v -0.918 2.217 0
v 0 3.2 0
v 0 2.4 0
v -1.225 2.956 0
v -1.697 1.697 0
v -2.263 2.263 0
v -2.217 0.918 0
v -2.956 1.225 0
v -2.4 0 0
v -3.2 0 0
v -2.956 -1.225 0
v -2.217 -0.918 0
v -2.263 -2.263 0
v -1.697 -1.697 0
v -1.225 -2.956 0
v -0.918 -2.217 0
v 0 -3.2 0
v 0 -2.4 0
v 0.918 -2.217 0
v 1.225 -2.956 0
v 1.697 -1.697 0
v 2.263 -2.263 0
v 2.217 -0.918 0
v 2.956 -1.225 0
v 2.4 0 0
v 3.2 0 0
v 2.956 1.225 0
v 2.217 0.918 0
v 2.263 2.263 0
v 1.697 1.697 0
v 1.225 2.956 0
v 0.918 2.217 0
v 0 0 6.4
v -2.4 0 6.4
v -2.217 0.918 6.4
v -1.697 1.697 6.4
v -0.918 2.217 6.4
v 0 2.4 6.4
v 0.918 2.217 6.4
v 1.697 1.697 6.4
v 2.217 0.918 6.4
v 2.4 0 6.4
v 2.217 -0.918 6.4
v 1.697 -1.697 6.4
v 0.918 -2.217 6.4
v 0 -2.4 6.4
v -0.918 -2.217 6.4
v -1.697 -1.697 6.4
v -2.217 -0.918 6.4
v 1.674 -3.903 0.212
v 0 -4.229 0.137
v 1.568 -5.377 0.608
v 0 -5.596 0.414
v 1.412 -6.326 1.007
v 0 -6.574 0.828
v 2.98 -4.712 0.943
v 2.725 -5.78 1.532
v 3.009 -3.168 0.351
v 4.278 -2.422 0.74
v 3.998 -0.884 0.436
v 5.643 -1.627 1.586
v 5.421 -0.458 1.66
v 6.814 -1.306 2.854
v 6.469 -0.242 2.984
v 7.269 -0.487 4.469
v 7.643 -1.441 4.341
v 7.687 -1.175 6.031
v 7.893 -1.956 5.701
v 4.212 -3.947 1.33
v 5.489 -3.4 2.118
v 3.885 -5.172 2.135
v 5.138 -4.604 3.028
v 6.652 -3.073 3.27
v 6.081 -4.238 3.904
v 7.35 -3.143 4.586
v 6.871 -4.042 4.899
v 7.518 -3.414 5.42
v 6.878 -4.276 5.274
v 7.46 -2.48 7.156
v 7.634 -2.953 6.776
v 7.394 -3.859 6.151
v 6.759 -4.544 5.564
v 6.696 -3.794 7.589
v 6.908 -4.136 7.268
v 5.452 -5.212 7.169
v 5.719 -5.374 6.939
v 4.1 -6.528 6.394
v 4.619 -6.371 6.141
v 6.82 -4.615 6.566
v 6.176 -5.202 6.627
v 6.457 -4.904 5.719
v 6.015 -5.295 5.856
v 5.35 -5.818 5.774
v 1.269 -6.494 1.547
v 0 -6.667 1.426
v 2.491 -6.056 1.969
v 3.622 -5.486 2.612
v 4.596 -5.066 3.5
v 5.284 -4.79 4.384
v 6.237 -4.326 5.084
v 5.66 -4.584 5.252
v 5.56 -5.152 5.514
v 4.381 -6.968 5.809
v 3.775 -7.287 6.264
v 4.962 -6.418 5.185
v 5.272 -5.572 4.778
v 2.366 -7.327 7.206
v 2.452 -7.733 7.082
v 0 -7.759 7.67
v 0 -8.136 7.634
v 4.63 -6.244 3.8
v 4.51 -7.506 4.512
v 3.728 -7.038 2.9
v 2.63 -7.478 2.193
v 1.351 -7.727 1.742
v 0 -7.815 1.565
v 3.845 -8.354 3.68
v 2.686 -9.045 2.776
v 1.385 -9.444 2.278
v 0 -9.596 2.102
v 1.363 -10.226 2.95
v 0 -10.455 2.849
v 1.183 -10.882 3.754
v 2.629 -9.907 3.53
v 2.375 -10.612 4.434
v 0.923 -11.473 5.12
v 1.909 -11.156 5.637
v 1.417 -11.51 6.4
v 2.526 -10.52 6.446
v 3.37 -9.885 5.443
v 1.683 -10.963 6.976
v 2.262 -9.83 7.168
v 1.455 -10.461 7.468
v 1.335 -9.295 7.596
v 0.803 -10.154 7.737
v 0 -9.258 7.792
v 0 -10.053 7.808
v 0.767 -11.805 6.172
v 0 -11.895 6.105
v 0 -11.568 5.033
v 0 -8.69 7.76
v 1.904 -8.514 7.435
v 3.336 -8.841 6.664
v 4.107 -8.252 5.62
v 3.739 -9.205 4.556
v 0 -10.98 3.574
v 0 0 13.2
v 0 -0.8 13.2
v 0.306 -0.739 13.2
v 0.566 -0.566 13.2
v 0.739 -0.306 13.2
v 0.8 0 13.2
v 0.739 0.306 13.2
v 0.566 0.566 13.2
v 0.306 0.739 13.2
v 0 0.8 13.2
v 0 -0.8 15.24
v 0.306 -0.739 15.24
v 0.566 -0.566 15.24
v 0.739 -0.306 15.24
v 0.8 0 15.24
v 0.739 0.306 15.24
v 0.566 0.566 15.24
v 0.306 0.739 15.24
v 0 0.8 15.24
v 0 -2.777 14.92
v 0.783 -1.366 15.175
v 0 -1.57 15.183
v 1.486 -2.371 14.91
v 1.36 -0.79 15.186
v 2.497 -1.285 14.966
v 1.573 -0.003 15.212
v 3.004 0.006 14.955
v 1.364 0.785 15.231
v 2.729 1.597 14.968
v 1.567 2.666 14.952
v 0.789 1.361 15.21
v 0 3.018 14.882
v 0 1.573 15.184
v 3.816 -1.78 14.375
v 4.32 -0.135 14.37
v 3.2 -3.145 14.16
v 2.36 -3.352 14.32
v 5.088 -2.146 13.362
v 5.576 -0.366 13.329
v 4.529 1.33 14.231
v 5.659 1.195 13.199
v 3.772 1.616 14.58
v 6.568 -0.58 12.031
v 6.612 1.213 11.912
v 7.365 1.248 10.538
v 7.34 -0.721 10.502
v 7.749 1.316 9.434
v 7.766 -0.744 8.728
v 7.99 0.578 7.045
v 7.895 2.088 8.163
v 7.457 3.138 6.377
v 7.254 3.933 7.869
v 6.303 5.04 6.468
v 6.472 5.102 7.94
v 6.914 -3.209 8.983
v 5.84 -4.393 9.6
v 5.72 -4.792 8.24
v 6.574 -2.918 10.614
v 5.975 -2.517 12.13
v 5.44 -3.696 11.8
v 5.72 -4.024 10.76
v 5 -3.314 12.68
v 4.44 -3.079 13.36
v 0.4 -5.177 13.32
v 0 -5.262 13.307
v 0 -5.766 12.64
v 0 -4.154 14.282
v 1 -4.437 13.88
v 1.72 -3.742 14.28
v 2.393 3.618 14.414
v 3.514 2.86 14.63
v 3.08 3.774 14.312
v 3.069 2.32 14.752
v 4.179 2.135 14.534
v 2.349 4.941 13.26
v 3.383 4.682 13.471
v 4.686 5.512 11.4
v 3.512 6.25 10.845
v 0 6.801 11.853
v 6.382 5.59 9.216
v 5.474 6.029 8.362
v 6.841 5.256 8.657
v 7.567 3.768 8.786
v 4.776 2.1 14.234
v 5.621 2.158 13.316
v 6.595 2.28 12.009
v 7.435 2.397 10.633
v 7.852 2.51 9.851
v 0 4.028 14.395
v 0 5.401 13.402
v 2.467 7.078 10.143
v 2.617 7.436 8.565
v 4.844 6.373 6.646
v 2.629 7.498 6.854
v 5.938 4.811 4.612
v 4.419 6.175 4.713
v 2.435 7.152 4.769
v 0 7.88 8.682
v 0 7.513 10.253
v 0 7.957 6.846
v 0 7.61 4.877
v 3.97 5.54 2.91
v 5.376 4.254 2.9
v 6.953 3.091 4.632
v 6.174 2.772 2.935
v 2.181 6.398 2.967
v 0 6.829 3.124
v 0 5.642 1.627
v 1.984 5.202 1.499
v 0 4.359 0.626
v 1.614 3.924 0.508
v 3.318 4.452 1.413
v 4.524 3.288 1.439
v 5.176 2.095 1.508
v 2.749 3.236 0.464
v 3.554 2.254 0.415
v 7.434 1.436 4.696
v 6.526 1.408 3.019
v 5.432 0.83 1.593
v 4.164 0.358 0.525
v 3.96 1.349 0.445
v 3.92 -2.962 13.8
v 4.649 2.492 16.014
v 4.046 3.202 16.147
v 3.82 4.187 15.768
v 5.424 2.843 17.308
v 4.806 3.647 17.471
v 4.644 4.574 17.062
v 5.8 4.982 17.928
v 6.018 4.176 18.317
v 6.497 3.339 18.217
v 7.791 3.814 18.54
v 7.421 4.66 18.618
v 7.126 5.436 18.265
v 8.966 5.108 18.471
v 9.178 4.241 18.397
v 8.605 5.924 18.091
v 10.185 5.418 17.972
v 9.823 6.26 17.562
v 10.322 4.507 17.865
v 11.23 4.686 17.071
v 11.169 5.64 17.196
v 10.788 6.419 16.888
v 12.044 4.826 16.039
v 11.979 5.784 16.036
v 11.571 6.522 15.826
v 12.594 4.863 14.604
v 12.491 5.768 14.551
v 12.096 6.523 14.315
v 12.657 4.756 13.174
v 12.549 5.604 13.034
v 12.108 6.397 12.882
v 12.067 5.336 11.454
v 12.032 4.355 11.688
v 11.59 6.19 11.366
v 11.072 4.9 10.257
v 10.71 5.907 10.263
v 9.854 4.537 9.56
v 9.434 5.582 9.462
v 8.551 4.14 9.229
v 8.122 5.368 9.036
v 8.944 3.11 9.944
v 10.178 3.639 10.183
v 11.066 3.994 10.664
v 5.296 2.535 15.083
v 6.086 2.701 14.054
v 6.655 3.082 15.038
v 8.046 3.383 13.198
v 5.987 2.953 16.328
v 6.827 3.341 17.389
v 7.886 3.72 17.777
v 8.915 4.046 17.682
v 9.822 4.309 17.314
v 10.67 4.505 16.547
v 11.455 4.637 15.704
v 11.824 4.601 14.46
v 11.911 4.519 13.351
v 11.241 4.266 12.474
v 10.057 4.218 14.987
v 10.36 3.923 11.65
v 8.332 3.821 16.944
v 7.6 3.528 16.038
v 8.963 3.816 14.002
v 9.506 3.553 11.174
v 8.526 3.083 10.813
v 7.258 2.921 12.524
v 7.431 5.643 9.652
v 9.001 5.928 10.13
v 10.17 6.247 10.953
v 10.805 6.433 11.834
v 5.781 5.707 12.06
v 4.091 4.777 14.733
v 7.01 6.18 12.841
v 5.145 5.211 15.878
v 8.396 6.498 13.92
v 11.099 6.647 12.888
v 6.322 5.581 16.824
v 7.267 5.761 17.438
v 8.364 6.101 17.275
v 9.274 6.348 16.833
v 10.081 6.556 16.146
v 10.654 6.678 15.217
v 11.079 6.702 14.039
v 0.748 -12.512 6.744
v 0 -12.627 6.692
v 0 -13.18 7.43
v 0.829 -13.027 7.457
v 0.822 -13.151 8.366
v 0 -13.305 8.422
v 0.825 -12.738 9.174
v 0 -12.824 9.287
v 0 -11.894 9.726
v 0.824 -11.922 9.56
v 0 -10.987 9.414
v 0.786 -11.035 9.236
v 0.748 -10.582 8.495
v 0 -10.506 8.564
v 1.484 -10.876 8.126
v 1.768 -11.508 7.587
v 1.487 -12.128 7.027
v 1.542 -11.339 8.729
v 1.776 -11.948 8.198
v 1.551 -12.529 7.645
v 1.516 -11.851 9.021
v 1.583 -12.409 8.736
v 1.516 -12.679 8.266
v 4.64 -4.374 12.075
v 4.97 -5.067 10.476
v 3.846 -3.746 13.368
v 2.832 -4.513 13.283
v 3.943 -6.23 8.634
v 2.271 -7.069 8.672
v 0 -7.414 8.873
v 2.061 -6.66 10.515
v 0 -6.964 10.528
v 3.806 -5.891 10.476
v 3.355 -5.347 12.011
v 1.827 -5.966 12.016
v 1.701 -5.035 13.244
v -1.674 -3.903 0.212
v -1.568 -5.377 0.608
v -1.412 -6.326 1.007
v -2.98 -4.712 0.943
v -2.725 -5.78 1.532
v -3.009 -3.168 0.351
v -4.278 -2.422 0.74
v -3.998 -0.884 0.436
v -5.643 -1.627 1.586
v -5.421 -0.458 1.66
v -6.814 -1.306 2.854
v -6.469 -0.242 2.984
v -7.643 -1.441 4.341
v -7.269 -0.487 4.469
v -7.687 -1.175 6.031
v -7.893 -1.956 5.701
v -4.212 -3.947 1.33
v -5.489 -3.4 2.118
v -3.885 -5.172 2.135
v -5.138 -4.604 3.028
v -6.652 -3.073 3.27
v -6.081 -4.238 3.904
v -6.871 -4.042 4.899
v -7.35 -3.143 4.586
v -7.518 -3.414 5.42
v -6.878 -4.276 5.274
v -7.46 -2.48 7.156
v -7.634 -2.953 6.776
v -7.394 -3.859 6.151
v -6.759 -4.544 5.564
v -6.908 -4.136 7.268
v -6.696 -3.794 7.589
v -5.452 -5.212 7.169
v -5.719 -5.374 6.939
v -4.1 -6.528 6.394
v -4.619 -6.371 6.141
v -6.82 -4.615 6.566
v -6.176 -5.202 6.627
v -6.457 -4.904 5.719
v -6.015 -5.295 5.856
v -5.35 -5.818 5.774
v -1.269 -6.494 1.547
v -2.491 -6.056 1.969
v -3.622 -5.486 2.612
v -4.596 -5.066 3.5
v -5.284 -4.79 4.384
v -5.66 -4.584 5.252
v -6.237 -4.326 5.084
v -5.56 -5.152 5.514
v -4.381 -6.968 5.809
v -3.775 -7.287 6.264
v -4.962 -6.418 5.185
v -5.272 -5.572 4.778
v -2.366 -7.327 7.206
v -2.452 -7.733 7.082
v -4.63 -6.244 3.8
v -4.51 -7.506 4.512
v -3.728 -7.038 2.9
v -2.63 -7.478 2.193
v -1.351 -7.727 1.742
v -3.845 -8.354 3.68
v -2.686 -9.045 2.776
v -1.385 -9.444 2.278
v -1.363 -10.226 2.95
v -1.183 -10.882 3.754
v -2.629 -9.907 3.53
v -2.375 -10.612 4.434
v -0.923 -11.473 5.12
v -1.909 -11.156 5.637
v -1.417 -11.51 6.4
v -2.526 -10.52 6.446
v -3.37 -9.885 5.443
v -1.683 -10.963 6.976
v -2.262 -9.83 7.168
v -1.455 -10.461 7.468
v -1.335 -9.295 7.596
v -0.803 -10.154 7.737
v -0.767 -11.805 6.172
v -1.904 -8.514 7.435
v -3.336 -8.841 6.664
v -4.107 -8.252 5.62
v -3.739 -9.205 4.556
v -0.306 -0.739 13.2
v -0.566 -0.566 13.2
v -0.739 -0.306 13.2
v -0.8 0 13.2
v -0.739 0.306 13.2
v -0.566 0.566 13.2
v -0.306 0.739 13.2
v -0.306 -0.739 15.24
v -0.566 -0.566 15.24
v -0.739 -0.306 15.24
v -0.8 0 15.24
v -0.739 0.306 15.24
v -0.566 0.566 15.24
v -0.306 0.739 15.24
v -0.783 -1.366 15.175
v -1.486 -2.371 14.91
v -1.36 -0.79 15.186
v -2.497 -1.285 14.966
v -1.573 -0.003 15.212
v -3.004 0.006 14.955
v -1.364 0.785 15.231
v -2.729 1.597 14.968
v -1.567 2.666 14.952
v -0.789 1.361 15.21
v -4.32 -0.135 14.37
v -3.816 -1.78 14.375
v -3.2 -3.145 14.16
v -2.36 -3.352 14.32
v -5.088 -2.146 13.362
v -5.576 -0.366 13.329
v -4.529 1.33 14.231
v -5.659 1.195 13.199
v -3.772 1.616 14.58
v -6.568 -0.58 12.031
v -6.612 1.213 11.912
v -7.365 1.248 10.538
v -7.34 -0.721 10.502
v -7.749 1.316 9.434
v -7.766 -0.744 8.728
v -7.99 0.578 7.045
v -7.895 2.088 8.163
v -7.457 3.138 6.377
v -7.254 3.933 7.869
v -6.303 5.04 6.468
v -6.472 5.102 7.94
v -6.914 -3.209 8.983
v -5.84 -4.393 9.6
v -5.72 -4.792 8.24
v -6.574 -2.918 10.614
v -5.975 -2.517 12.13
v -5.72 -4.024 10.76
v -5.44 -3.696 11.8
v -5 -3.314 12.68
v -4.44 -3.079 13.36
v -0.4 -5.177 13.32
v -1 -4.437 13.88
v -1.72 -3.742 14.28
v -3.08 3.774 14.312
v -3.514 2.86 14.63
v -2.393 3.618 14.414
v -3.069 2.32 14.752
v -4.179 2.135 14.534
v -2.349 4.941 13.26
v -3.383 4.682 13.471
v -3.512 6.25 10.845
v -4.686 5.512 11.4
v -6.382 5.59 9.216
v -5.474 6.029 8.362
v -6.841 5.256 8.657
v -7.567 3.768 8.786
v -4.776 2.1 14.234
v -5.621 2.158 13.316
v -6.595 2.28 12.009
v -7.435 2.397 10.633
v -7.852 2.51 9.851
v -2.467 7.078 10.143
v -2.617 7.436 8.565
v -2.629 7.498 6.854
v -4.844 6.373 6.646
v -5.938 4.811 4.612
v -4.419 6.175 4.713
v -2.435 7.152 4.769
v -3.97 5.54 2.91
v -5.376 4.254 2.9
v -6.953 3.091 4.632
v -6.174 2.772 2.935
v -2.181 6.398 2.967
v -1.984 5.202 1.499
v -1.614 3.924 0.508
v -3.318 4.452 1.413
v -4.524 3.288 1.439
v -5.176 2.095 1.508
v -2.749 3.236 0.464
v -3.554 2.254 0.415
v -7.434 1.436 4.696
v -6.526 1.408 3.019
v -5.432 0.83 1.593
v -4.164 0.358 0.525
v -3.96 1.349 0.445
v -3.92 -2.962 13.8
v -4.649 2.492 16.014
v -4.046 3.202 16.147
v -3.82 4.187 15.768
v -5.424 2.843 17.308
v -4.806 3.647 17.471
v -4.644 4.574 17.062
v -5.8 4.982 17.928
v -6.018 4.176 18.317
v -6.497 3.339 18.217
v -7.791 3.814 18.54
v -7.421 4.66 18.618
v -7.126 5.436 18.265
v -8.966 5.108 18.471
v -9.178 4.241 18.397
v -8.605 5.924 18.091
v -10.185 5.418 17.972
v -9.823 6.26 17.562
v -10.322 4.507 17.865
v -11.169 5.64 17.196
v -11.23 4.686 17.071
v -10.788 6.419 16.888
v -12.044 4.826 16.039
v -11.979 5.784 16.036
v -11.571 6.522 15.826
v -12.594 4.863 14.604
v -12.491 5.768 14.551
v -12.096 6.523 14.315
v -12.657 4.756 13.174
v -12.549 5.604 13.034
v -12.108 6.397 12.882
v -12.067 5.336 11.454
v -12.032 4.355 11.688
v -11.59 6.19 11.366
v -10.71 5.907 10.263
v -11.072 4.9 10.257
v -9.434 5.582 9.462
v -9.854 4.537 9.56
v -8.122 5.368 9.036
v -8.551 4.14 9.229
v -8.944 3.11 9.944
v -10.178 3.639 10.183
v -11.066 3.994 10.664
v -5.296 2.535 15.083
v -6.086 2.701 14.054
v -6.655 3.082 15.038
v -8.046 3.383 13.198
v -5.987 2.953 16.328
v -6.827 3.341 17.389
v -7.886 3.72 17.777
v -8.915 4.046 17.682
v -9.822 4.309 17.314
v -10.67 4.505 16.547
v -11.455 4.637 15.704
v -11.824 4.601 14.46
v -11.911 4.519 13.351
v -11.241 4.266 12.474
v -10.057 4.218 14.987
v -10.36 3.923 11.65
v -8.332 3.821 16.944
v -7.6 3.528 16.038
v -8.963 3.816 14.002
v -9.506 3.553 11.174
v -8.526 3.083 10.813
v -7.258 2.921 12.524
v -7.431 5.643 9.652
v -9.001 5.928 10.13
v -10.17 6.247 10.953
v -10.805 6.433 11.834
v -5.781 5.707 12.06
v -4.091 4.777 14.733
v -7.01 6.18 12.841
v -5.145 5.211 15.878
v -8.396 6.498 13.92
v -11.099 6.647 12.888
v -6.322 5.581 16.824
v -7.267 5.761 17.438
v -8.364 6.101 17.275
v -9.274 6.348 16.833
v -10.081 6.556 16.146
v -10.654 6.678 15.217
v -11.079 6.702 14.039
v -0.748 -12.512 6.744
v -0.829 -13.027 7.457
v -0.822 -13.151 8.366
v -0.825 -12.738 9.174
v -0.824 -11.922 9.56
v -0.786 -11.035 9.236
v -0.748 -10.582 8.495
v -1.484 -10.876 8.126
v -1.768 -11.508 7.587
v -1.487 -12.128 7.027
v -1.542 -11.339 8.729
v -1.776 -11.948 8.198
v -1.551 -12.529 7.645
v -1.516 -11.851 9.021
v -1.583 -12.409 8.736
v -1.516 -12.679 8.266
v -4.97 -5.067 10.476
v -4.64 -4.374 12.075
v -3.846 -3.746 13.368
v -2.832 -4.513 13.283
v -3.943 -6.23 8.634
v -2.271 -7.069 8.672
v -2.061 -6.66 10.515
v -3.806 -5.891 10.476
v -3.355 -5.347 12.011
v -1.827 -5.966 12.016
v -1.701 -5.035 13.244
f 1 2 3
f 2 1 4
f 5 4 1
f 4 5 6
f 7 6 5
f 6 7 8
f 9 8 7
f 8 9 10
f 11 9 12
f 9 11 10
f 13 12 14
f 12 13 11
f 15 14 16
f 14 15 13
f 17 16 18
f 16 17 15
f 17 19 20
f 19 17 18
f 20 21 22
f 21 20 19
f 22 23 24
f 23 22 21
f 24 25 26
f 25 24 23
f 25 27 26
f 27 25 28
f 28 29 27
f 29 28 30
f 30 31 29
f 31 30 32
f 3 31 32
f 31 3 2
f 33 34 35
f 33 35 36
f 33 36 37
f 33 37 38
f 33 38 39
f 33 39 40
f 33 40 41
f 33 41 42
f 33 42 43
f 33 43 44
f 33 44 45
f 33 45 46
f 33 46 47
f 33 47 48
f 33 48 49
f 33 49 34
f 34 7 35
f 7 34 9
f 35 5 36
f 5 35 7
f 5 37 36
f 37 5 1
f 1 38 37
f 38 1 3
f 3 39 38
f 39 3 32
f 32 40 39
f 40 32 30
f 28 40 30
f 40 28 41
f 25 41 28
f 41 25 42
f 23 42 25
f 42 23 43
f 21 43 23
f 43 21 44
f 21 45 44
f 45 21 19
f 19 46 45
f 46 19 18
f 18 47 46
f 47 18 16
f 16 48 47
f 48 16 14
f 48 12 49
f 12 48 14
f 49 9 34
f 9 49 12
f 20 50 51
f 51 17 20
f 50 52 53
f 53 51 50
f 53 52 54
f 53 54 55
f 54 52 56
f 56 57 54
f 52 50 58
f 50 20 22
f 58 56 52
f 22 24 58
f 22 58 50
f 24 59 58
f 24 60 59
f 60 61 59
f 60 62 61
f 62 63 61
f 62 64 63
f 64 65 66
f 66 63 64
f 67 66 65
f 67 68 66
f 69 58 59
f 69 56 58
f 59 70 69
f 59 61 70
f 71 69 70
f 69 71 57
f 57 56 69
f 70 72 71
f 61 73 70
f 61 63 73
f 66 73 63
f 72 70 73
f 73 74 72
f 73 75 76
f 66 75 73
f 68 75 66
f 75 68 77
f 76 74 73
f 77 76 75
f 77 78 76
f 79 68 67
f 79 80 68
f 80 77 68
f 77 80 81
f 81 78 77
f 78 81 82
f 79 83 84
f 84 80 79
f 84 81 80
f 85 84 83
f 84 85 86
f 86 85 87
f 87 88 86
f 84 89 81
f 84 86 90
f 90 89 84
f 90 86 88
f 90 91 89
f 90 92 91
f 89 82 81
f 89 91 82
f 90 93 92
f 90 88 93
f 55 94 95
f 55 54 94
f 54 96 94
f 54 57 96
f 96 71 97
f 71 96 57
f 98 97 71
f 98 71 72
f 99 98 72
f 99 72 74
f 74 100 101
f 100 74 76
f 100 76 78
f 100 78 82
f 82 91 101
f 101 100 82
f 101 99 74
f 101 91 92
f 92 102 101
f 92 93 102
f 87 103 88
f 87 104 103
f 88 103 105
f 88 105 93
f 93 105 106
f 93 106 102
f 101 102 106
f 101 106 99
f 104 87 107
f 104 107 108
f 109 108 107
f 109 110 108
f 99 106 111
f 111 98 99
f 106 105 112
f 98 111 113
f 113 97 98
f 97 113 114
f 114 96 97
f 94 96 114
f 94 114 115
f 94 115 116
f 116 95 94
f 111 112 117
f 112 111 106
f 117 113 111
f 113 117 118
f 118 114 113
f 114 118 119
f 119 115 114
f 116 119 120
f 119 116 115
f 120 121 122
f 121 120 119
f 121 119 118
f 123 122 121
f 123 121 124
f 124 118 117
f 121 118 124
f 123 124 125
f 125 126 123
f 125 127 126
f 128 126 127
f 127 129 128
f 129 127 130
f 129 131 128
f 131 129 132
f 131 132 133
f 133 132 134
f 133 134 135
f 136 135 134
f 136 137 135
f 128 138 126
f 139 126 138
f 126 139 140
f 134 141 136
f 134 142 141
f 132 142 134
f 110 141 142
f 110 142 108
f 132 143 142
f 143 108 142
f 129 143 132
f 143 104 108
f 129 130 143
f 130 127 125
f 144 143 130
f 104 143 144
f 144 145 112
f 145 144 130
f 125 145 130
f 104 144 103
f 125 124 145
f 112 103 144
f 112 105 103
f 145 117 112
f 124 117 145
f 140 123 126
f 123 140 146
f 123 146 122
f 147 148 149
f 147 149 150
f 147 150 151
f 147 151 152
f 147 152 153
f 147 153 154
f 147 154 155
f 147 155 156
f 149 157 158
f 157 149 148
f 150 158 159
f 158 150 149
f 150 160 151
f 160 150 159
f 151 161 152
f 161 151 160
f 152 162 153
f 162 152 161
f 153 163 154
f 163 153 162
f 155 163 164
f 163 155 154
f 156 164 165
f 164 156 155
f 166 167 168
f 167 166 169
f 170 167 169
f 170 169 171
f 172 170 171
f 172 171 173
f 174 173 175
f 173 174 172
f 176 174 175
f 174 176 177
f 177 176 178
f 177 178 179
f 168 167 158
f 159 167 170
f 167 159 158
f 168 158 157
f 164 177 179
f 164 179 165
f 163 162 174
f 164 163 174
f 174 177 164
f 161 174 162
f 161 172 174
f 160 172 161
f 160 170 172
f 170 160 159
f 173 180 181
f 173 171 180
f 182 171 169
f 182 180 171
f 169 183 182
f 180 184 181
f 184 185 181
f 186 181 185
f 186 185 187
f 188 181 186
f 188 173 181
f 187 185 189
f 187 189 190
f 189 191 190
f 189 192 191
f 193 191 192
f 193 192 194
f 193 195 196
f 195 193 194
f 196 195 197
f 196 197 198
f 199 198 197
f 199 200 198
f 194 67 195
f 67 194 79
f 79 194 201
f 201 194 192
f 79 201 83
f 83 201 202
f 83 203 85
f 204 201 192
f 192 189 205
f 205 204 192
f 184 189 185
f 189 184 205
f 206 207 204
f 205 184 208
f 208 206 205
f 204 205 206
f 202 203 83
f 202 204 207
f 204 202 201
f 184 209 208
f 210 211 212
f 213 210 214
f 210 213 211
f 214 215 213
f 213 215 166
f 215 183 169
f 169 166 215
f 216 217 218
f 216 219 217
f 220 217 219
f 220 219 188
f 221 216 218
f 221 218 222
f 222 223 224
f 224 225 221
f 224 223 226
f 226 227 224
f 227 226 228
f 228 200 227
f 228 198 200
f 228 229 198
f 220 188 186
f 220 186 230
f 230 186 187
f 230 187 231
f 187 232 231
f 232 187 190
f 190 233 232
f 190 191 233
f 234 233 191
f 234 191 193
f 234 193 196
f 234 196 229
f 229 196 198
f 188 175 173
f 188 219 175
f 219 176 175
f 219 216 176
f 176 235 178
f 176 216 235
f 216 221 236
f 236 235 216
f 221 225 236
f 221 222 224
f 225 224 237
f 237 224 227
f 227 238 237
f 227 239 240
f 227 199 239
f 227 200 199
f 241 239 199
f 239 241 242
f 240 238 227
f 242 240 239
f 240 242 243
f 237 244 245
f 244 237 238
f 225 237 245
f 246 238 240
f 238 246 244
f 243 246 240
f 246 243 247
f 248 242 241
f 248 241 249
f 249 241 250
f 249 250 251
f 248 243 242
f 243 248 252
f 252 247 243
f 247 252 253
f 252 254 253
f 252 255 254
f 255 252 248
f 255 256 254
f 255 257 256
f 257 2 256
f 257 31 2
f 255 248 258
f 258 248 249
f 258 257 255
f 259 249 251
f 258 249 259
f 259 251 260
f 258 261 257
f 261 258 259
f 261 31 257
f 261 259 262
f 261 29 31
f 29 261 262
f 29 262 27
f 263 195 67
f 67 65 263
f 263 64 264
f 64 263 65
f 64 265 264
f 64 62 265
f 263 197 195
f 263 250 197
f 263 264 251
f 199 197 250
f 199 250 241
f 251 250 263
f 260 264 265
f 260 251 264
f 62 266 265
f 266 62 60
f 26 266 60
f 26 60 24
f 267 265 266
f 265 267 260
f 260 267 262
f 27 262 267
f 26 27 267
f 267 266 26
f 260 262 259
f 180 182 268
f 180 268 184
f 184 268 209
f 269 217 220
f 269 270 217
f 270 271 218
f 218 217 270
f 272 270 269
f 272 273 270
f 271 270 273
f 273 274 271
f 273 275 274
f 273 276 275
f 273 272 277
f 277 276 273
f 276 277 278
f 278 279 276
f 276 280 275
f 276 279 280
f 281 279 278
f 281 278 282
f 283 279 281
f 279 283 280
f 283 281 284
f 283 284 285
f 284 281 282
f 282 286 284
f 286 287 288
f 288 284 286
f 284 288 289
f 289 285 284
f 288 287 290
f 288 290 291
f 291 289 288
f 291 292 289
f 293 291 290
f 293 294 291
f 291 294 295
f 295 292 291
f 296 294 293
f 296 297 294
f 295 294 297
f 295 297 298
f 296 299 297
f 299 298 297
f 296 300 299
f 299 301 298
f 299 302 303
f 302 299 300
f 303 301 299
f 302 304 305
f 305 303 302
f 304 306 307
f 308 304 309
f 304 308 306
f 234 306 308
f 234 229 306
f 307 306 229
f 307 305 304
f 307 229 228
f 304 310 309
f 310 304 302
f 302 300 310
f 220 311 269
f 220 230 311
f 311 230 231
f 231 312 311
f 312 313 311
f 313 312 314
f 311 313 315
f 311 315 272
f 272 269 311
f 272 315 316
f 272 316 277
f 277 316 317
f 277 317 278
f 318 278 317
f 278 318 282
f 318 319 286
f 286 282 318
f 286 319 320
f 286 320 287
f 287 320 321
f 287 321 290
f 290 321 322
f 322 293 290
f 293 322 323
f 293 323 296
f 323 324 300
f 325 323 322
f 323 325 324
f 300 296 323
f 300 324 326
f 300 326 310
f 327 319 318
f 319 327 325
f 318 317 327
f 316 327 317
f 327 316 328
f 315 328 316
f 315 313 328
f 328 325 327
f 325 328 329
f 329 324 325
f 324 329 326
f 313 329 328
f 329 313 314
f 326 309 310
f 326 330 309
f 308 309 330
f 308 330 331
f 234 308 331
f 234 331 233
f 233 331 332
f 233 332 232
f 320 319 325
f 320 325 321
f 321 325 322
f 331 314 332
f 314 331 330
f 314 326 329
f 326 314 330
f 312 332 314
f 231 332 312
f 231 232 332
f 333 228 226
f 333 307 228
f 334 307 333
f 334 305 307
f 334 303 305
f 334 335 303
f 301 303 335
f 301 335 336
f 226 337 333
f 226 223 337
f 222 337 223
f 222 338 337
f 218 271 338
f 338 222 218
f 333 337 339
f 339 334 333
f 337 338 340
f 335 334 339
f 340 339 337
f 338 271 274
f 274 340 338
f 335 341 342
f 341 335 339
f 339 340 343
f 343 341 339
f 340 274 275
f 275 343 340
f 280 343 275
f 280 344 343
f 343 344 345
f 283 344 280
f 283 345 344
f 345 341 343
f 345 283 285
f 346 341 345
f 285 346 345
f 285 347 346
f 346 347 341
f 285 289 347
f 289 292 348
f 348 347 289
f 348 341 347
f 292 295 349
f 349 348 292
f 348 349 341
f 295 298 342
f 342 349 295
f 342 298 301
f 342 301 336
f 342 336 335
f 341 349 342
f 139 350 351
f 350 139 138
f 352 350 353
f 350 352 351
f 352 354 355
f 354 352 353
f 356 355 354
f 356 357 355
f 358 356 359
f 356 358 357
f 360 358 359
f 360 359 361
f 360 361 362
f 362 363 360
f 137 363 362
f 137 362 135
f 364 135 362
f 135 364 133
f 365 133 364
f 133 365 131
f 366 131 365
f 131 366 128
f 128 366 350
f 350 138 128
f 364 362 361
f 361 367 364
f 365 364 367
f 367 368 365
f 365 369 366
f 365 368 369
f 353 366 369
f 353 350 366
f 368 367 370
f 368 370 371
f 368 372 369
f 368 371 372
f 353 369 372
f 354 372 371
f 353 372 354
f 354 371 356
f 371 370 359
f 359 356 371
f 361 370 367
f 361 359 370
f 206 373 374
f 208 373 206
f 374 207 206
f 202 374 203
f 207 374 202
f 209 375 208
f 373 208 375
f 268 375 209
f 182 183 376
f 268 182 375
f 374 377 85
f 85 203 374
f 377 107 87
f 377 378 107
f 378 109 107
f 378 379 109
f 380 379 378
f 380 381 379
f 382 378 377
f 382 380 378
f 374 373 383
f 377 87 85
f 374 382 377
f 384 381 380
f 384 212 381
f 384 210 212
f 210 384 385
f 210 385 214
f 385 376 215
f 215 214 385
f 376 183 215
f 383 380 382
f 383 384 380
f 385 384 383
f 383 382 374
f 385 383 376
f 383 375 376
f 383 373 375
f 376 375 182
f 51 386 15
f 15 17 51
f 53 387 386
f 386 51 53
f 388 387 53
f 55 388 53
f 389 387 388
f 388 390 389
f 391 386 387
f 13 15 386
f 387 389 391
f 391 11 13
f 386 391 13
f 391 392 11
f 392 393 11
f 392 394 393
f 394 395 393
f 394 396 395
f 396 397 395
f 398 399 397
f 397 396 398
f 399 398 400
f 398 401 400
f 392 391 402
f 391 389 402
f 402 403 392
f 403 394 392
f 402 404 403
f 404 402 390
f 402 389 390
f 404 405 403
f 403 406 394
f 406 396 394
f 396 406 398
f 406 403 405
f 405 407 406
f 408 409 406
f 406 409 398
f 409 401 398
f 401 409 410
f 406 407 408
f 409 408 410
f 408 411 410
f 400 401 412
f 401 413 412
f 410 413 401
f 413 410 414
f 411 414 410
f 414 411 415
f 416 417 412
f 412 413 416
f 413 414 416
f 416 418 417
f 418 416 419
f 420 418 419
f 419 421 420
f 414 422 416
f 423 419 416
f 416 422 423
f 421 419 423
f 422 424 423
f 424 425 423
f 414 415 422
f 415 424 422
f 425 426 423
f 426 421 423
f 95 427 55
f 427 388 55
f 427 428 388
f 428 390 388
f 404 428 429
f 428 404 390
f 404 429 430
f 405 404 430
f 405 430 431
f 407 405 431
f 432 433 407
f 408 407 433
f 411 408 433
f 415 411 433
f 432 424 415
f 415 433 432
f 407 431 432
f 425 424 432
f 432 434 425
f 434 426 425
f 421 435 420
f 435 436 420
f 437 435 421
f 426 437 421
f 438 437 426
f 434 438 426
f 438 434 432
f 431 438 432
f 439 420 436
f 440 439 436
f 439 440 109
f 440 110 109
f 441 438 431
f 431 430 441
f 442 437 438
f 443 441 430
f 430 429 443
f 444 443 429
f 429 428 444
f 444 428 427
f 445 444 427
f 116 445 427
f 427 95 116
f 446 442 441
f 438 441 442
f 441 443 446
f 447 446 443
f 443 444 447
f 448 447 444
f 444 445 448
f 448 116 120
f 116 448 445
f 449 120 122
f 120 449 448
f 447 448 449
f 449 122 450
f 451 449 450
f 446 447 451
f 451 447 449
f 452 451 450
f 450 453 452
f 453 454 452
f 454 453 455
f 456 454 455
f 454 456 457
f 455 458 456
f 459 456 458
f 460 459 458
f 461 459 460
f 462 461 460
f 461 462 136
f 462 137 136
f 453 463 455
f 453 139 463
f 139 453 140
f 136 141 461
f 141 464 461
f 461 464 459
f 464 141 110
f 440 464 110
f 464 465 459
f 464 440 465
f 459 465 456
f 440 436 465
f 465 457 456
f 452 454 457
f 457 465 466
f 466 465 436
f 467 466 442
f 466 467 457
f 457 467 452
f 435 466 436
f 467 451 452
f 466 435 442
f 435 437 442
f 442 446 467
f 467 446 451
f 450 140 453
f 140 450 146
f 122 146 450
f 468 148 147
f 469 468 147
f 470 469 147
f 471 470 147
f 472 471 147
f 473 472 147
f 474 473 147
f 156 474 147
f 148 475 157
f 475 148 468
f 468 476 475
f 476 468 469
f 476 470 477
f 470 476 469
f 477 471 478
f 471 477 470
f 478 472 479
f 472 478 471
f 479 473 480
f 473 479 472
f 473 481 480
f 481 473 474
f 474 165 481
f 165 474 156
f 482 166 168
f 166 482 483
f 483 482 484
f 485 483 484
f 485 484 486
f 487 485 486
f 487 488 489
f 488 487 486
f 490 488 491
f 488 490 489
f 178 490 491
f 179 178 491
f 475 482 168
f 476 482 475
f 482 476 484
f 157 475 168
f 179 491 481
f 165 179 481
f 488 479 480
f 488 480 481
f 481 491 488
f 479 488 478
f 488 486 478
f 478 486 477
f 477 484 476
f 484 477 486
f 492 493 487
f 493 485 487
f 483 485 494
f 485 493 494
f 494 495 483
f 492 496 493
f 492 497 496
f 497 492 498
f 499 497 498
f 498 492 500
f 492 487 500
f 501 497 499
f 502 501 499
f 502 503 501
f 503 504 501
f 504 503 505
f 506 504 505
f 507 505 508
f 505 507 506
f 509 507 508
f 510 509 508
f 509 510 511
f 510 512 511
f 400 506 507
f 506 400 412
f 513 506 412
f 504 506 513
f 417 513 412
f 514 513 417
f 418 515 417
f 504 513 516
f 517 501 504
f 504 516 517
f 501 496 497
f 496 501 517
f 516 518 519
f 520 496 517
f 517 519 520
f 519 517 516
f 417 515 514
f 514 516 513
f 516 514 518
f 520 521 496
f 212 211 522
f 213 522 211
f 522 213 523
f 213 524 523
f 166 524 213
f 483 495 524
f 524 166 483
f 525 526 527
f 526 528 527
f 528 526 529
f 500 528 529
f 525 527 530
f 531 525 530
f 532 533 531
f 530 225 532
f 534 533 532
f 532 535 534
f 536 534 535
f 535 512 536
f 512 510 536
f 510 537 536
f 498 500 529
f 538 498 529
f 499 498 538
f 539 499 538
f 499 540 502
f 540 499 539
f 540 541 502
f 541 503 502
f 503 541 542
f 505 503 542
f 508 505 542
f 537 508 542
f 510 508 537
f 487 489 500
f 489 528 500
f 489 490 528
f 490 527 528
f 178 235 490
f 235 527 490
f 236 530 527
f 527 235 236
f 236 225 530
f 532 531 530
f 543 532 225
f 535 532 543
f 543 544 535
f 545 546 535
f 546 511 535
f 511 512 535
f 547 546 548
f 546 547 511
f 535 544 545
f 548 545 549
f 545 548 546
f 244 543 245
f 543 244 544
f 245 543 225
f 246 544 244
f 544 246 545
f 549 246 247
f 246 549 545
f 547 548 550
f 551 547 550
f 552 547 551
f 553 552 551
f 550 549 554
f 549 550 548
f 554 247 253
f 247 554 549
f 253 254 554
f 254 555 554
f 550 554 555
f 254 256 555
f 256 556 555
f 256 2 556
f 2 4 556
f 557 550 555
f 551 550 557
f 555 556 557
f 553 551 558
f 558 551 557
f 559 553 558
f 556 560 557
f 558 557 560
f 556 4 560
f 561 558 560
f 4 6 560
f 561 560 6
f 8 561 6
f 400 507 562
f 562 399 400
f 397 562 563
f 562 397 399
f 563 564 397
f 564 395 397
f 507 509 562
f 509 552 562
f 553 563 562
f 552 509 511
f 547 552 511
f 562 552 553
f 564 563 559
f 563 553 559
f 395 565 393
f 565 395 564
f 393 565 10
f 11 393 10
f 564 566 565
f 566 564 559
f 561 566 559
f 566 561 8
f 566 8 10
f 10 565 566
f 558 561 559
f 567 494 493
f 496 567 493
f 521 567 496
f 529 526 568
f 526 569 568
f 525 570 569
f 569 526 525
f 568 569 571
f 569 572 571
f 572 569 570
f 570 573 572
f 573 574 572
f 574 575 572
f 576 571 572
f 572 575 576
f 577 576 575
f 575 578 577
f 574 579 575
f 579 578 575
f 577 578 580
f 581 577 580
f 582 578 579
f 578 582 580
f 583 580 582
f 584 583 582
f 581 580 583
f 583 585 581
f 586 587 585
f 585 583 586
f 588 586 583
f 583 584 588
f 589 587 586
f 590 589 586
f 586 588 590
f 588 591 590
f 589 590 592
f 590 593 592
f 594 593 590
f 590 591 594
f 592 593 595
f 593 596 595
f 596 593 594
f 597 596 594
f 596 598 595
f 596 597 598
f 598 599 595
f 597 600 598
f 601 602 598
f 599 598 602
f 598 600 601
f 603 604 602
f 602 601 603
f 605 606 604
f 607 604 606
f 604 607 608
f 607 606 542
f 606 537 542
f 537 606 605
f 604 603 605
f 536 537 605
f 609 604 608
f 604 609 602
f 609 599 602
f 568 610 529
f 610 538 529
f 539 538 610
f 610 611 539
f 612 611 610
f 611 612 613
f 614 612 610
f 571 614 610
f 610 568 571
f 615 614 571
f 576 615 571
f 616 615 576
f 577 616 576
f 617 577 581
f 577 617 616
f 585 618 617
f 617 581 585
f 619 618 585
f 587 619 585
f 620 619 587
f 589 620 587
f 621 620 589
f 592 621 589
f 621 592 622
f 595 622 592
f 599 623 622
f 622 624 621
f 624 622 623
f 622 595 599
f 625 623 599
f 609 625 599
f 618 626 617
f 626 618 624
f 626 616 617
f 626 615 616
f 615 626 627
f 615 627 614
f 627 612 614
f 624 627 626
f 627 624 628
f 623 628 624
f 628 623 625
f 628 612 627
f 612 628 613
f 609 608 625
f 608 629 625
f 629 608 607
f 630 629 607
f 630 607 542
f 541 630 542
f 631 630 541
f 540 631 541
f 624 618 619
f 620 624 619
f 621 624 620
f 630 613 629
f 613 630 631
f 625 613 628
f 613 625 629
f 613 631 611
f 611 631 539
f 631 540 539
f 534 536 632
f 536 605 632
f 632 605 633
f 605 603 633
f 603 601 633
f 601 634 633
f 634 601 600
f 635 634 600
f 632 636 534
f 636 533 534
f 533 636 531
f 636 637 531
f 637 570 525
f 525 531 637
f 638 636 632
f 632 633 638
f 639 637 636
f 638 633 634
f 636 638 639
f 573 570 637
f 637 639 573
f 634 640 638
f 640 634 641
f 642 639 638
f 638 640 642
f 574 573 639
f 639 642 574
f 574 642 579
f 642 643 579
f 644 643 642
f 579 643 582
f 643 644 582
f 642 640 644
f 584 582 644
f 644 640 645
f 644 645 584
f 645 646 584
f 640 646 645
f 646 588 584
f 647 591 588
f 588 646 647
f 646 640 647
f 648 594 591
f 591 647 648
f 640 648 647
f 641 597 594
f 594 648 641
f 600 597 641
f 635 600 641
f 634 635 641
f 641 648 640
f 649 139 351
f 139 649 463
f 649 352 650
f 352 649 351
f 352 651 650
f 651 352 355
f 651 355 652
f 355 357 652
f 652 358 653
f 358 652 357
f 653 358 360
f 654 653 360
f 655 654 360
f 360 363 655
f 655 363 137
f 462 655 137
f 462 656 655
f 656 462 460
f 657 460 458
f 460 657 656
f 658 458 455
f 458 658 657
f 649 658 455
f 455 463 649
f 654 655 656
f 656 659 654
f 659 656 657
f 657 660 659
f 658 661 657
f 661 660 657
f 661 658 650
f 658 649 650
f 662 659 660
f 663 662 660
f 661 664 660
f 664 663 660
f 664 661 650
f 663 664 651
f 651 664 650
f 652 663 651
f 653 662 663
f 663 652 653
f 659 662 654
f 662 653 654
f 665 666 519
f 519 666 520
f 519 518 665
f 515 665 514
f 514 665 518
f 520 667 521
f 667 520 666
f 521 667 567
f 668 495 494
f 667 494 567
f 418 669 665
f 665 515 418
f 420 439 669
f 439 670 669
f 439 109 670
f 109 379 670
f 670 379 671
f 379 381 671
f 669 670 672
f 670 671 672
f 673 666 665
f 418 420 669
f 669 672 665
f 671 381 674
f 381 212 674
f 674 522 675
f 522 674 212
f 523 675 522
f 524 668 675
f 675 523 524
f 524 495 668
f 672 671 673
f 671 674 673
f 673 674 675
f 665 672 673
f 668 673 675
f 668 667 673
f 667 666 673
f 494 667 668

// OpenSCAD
use <../lib.scad>
use <s/24629s01.scad>
use <s/24629s02.scad>
use <s/24629s03.scad>
use <s/24629s04.scad>
use <s/24629s05.scad>
use <../p/stud4o.scad>
function ldraw_lib__24629() = [
// 0 Minifig Head Mouse
// 0 Name: 24629.dat
// 0 Author: Philippe Hurbain [Philo]
// 0 !LDRAW_ORG Part UPDATE 2024-04
// 0 !LICENSE Licensed under CC BY 4.0 : see CAreadme.txt
// 
// 0 BFC CERTIFY CCW
  [0,"BFC","CERTIFY"],
  [0,"BFC","CCW"],
// 
// 0 !KEYWORDS Disney, Mickey, Minnie
// 
// 0 !HISTORY 2022-02-06 {LEGO Instructions App} Original part shape
// 0 !HISTORY 2022-02-07 [Philo] File preparation for LDraw Parts Tracker
// 0 !HISTORY 2024-05-28 [OrionP] Official Update 2024-04
// 
// 
// 1 16 0 -16 0 1 0 0 0 -4 0 0 0 1 stud4o.dat
  [1,16,0,-16,0,1,0,0,0,-4,0,0,0,1, ldraw_lib__stud4o()],
// 1 16 0 0 0 1 0 0 0 1 0 0 0 1 s\24629s01.dat
  [1,16,0,0,0,1,0,0,0,1,0,0,0,1, ldraw_lib__s__24629s01()],
// 1 16 0 0 0 1 0 0 0 1 0 0 0 1 s\24629s02.dat
  [1,16,0,0,0,1,0,0,0,1,0,0,0,1, ldraw_lib__s__24629s02()],
// 1 16 0 0 0 1 0 0 0 1 0 0 0 1 s\24629s03.dat
  [1,16,0,0,0,1,0,0,0,1,0,0,0,1, ldraw_lib__s__24629s03()],
// 1 16 0 0 0 1 0 0 0 1 0 0 0 1 s\24629s04.dat
  [1,16,0,0,0,1,0,0,0,1,0,0,0,1, ldraw_lib__s__24629s04()],
// 1 16 0 0 0 1 0 0 0 1 0 0 0 1 s\24629s05.dat
  [1,16,0,0,0,1,0,0,0,1,0,0,0,1, ldraw_lib__s__24629s05()],
// 1 16 0 0 0 -1 0 0 0 1 0 0 0 1 s\24629s01.dat
  [1,16,0,0,0,-1,0,0,0,1,0,0,0,1, ldraw_lib__s__24629s01()],
// 1 16 0 0 0 -1 0 0 0 1 0 0 0 1 s\24629s02.dat
  [1,16,0,0,0,-1,0,0,0,1,0,0,0,1, ldraw_lib__s__24629s02()],
// 1 16 0 0 0 -1 0 0 0 1 0 0 0 1 s\24629s03.dat
  [1,16,0,0,0,-1,0,0,0,1,0,0,0,1, ldraw_lib__s__24629s03()],
// 1 16 0 0 0 -1 0 0 0 1 0 0 0 1 s\24629s04.dat
  [1,16,0,0,0,-1,0,0,0,1,0,0,0,1, ldraw_lib__s__24629s04()],
// 1 16 0 0 0 -1 0 0 0 1 0 0 0 1 s\24629s05.dat
  [1,16,0,0,0,-1,0,0,0,1,0,0,0,1, ldraw_lib__s__24629s05()],
];
module ldraw_lib__24629(step=0, col=false, unit=2/5, alt=false, line=0.2, solid=!$preview)
    makepoly(ldraw_lib__24629(), step=step, col=col, unit=unit, alt=alt, line=line, solid=solid);
ldraw_lib__24629(line=0.2);
